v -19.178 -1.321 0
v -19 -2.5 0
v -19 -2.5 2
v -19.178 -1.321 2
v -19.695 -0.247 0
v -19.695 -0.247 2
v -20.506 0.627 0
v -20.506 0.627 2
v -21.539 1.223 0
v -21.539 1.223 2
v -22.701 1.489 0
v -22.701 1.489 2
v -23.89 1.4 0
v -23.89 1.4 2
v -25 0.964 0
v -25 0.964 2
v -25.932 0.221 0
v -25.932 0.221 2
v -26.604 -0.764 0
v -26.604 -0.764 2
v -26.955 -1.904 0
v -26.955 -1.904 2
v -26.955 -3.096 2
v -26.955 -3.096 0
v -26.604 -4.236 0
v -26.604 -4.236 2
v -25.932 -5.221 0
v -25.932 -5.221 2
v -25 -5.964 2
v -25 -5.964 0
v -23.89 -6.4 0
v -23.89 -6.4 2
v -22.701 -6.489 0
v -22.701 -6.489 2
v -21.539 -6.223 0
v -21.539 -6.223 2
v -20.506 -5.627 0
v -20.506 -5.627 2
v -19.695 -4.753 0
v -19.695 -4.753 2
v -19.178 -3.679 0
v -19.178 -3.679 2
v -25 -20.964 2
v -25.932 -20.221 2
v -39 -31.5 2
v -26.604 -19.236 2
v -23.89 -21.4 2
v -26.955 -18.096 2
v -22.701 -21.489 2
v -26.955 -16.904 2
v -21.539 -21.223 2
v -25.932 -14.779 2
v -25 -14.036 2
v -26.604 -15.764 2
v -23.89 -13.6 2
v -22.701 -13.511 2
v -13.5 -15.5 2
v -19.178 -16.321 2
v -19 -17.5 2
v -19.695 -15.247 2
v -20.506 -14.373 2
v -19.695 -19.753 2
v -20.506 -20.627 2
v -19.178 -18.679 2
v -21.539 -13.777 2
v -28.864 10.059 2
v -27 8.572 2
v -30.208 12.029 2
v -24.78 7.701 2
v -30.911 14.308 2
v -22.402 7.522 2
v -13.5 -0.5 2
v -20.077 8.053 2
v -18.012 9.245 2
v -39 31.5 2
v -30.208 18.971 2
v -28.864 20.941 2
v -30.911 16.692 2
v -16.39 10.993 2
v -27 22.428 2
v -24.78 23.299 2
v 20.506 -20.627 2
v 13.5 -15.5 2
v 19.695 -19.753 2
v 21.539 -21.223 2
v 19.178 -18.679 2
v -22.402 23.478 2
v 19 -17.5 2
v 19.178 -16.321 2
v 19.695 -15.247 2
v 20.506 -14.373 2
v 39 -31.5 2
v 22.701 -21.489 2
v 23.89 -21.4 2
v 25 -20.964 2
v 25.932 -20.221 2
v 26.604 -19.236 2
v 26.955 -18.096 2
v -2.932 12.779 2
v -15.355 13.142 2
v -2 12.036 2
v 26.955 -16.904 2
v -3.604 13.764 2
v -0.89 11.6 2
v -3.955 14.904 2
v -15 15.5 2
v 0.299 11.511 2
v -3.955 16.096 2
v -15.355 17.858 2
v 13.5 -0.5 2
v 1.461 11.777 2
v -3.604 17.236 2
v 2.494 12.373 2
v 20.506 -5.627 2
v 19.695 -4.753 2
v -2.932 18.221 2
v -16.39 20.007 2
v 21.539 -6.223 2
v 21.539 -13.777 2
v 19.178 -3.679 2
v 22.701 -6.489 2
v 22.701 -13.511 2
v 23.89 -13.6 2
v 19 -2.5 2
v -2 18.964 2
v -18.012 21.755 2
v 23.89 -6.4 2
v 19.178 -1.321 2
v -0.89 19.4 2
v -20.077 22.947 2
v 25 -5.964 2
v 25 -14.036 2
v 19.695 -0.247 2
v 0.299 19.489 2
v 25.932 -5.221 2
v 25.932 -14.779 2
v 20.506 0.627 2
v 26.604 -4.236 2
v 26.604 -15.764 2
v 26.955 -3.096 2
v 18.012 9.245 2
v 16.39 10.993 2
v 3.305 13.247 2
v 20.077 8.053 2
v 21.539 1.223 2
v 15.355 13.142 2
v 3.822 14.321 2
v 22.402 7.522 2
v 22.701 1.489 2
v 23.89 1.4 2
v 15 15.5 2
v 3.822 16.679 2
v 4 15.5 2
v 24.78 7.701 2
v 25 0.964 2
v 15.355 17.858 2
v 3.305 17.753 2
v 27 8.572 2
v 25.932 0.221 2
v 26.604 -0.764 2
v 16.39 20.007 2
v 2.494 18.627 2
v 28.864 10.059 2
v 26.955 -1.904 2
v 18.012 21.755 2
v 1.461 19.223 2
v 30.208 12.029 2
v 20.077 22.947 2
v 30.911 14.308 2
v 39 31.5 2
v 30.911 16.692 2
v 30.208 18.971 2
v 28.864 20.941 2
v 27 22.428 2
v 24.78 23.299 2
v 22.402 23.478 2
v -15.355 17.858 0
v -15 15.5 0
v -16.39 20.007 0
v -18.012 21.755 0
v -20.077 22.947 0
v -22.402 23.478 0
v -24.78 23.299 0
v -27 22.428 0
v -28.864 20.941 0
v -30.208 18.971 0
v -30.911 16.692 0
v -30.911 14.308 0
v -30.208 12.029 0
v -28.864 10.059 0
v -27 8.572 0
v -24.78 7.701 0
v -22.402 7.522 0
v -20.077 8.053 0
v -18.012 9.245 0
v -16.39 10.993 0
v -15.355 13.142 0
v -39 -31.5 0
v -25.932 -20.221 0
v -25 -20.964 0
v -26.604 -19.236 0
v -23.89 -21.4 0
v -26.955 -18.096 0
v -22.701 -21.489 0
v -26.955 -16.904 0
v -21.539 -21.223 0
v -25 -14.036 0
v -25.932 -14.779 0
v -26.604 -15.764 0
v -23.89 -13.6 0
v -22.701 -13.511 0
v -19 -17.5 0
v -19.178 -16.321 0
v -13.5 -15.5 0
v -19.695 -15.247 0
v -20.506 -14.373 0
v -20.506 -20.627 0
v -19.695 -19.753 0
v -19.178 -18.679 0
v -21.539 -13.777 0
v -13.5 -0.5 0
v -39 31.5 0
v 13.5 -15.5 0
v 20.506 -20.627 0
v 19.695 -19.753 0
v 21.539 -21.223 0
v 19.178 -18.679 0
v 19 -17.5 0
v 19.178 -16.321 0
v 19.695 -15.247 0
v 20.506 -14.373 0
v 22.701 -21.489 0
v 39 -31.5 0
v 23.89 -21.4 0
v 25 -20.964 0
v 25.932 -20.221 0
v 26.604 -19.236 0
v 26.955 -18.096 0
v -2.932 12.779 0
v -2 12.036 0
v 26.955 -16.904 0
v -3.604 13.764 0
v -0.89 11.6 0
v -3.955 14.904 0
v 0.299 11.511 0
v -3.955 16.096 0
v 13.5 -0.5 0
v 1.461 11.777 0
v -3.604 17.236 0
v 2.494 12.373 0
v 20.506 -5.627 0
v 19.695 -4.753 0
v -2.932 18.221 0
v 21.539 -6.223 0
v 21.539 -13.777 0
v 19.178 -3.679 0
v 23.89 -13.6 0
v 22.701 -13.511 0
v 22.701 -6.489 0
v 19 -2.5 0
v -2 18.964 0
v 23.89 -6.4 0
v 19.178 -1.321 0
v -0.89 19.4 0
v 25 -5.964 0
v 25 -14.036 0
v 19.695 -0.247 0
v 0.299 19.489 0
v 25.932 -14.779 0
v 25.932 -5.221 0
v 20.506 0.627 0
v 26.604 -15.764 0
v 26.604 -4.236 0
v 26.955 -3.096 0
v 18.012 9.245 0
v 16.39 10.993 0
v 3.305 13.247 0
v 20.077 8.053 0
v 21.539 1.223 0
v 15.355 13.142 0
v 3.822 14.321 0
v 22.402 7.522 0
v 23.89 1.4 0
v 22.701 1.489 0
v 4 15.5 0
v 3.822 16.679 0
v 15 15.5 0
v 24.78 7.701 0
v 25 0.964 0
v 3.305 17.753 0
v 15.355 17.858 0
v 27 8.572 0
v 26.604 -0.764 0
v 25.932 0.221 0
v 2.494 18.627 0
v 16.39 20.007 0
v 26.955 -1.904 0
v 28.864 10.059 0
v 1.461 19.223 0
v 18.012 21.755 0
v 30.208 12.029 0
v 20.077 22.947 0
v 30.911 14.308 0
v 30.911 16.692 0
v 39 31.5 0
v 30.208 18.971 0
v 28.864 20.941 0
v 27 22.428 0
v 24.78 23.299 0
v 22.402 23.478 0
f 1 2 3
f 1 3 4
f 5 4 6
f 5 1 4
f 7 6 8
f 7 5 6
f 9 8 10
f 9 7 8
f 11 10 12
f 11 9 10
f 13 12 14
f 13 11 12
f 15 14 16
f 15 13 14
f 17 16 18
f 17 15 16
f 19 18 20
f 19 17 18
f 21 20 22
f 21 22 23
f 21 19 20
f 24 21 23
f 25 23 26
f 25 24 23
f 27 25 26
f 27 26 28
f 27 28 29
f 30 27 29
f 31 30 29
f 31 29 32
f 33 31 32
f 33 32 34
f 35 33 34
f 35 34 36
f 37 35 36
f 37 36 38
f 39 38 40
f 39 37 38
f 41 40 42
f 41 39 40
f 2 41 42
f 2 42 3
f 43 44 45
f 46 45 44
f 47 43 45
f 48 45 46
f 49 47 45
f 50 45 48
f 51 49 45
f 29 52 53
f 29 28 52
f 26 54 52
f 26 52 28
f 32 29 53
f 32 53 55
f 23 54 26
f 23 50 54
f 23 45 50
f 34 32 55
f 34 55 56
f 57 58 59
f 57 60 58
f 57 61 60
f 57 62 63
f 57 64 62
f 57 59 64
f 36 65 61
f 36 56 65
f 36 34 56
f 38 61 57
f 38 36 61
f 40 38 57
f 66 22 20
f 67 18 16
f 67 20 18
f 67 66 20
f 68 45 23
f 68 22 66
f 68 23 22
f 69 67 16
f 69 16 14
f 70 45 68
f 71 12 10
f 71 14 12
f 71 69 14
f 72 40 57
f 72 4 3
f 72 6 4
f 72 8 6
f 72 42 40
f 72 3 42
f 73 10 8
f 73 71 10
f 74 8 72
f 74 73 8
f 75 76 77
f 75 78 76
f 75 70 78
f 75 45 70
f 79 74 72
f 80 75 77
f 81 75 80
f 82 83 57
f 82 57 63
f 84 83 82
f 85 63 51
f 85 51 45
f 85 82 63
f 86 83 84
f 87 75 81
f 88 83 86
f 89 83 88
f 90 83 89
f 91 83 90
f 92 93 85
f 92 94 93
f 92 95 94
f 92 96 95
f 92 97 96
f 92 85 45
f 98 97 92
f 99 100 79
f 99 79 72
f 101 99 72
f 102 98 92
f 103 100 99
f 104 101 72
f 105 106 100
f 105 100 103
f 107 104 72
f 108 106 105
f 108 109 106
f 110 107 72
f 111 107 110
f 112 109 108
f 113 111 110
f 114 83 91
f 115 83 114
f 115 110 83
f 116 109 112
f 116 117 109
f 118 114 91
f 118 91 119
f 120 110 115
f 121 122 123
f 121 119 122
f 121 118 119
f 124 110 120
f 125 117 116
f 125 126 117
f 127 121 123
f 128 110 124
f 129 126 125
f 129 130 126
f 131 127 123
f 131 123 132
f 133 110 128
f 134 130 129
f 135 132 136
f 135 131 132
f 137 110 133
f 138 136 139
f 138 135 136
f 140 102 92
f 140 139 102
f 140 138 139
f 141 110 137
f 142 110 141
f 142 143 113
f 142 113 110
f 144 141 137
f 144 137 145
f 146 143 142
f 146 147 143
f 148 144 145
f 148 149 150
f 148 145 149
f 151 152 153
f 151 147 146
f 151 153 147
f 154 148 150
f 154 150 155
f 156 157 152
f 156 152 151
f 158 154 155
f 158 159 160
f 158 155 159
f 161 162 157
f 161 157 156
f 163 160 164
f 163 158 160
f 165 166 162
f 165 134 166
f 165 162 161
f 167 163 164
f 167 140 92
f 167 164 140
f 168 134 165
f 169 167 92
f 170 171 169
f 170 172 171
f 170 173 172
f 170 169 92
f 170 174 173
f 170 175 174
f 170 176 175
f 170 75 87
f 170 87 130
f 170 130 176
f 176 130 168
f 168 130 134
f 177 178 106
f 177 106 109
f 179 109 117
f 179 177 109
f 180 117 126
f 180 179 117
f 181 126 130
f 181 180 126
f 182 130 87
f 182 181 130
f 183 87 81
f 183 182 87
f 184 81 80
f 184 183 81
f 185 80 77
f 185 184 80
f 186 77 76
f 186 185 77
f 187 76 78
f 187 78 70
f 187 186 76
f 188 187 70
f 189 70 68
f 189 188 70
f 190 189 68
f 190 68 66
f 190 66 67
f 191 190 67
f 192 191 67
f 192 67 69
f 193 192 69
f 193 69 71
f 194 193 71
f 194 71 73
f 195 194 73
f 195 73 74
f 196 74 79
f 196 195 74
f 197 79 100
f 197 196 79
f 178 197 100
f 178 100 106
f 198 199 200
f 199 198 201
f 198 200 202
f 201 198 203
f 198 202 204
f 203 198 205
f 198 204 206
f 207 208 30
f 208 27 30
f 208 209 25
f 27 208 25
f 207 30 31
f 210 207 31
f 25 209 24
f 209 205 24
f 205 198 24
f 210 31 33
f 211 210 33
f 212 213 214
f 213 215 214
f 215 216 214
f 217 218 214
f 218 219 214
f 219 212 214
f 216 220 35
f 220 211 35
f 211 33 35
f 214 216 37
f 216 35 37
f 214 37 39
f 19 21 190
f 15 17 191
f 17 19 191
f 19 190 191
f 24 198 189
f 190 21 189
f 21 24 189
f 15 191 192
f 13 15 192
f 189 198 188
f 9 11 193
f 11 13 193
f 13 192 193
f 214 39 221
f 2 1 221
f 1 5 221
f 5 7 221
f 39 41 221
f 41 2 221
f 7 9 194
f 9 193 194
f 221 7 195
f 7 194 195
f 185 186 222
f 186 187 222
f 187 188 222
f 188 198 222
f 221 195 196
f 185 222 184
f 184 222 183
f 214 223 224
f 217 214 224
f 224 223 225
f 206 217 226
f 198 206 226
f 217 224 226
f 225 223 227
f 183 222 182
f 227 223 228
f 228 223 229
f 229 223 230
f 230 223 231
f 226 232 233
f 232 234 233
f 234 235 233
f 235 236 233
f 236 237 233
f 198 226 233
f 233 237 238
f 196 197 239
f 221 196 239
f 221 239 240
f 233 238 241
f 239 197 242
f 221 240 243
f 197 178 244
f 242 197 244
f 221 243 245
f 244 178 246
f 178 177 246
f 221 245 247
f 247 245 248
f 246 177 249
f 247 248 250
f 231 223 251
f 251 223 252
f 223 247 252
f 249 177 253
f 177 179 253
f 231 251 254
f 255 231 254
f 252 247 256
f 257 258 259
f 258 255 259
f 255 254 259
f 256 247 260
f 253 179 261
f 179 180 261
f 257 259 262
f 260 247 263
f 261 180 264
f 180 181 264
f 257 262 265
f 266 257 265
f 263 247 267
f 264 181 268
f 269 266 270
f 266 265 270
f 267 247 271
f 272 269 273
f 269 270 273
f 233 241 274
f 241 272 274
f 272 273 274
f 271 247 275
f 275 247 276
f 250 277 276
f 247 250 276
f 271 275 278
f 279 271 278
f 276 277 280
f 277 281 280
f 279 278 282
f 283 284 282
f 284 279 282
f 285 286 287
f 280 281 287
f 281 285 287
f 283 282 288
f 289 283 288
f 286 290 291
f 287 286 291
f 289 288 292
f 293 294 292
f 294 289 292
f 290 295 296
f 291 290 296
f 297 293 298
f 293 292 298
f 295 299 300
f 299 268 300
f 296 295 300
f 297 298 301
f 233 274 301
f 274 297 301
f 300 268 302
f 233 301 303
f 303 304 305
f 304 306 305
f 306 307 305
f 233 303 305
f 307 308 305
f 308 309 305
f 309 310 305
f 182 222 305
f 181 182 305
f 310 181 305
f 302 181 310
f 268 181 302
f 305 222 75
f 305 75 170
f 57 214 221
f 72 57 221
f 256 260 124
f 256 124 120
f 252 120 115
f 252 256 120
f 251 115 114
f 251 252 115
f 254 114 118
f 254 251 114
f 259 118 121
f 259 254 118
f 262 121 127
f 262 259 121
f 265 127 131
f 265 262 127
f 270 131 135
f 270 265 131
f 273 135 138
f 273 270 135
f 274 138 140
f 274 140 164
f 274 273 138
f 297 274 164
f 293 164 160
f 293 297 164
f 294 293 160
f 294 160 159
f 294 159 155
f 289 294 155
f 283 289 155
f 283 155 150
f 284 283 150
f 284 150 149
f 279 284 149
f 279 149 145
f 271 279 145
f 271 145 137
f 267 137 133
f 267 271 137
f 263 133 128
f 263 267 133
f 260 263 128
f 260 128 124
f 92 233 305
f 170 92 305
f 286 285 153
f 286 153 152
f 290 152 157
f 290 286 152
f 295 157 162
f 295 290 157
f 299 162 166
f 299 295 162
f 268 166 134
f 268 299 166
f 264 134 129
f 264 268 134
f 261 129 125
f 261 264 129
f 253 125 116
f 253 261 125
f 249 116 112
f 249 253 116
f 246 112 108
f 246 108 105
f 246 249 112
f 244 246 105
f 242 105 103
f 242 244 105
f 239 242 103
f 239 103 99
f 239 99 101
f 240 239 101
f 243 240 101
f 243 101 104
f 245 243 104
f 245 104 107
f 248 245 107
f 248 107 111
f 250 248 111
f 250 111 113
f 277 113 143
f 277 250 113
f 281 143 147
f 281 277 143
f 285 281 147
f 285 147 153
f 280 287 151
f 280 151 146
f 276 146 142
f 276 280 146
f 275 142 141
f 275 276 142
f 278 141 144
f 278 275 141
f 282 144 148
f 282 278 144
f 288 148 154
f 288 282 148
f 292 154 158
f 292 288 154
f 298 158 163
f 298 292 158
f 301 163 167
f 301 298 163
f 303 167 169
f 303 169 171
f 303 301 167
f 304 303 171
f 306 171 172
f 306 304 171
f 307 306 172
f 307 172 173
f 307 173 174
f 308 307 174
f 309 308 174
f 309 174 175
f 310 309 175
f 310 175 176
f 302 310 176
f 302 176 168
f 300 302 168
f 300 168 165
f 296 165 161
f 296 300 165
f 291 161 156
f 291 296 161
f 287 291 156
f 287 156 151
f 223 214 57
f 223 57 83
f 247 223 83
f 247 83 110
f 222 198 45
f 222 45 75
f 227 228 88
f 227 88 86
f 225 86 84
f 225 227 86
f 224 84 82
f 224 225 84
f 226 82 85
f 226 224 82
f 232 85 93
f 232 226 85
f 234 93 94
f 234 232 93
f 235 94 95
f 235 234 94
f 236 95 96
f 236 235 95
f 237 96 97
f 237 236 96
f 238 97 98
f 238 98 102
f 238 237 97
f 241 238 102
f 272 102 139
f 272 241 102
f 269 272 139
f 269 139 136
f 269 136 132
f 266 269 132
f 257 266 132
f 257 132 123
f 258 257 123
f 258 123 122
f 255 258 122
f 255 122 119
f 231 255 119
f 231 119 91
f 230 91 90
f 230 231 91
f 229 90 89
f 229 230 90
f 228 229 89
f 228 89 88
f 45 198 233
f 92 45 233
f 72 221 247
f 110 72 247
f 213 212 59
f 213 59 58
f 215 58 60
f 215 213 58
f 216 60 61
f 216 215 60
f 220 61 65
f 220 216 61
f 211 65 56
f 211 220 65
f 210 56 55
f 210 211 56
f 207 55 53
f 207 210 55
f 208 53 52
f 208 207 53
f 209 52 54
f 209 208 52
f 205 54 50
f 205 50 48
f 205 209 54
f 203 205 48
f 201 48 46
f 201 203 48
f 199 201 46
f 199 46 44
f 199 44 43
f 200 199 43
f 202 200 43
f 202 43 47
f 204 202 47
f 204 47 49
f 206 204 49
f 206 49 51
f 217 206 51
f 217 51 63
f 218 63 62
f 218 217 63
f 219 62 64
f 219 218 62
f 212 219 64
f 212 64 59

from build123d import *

# Parameters (mm, degrees)
SKETCH1_W           = 78
SKETCH1_H           = 63
SKETCH1_R           = 8
SKETCH1_R_2         = 4
SKETCH1_W_2         = 27
SKETCH1_H_2         = 15
BOSS_EXTRUDE1_DEPTH = 2


with BuildPart() as part:
    # Sketch1 → Boss-Extrude1 (new body)
    with BuildSketch(Plane.XY):
        Rectangle(SKETCH1_W, SKETCH1_H)
        with Locations(Location((23, 15.5, 0), (0, 0, 180))):
            Circle(SKETCH1_R, mode=Mode.SUBTRACT)
        with Locations((0, 15.5)):
            Circle(SKETCH1_R_2, mode=Mode.SUBTRACT)
        with Locations((-23, -17.5)):
            Circle(SKETCH1_R_2, mode=Mode.SUBTRACT)
        with Locations(Location((23, -2.5, 0), (0, 0, 180))):
            Circle(SKETCH1_R_2, mode=Mode.SUBTRACT)
        with Locations(Location((23, -17.5, 0), (0, 0, 180))):
            Circle(SKETCH1_R_2, mode=Mode.SUBTRACT)
        with Locations((-23, -2.5)):
            Circle(SKETCH1_R_2, mode=Mode.SUBTRACT)
        with Locations((-23, 15.5)):
            Circle(SKETCH1_R, mode=Mode.SUBTRACT)
        with Locations((0, -8)):
            Rectangle(SKETCH1_W_2, SKETCH1_H_2, mode=Mode.SUBTRACT)
    extrude(amount=BOSS_EXTRUDE1_DEPTH)


solid = part.part
